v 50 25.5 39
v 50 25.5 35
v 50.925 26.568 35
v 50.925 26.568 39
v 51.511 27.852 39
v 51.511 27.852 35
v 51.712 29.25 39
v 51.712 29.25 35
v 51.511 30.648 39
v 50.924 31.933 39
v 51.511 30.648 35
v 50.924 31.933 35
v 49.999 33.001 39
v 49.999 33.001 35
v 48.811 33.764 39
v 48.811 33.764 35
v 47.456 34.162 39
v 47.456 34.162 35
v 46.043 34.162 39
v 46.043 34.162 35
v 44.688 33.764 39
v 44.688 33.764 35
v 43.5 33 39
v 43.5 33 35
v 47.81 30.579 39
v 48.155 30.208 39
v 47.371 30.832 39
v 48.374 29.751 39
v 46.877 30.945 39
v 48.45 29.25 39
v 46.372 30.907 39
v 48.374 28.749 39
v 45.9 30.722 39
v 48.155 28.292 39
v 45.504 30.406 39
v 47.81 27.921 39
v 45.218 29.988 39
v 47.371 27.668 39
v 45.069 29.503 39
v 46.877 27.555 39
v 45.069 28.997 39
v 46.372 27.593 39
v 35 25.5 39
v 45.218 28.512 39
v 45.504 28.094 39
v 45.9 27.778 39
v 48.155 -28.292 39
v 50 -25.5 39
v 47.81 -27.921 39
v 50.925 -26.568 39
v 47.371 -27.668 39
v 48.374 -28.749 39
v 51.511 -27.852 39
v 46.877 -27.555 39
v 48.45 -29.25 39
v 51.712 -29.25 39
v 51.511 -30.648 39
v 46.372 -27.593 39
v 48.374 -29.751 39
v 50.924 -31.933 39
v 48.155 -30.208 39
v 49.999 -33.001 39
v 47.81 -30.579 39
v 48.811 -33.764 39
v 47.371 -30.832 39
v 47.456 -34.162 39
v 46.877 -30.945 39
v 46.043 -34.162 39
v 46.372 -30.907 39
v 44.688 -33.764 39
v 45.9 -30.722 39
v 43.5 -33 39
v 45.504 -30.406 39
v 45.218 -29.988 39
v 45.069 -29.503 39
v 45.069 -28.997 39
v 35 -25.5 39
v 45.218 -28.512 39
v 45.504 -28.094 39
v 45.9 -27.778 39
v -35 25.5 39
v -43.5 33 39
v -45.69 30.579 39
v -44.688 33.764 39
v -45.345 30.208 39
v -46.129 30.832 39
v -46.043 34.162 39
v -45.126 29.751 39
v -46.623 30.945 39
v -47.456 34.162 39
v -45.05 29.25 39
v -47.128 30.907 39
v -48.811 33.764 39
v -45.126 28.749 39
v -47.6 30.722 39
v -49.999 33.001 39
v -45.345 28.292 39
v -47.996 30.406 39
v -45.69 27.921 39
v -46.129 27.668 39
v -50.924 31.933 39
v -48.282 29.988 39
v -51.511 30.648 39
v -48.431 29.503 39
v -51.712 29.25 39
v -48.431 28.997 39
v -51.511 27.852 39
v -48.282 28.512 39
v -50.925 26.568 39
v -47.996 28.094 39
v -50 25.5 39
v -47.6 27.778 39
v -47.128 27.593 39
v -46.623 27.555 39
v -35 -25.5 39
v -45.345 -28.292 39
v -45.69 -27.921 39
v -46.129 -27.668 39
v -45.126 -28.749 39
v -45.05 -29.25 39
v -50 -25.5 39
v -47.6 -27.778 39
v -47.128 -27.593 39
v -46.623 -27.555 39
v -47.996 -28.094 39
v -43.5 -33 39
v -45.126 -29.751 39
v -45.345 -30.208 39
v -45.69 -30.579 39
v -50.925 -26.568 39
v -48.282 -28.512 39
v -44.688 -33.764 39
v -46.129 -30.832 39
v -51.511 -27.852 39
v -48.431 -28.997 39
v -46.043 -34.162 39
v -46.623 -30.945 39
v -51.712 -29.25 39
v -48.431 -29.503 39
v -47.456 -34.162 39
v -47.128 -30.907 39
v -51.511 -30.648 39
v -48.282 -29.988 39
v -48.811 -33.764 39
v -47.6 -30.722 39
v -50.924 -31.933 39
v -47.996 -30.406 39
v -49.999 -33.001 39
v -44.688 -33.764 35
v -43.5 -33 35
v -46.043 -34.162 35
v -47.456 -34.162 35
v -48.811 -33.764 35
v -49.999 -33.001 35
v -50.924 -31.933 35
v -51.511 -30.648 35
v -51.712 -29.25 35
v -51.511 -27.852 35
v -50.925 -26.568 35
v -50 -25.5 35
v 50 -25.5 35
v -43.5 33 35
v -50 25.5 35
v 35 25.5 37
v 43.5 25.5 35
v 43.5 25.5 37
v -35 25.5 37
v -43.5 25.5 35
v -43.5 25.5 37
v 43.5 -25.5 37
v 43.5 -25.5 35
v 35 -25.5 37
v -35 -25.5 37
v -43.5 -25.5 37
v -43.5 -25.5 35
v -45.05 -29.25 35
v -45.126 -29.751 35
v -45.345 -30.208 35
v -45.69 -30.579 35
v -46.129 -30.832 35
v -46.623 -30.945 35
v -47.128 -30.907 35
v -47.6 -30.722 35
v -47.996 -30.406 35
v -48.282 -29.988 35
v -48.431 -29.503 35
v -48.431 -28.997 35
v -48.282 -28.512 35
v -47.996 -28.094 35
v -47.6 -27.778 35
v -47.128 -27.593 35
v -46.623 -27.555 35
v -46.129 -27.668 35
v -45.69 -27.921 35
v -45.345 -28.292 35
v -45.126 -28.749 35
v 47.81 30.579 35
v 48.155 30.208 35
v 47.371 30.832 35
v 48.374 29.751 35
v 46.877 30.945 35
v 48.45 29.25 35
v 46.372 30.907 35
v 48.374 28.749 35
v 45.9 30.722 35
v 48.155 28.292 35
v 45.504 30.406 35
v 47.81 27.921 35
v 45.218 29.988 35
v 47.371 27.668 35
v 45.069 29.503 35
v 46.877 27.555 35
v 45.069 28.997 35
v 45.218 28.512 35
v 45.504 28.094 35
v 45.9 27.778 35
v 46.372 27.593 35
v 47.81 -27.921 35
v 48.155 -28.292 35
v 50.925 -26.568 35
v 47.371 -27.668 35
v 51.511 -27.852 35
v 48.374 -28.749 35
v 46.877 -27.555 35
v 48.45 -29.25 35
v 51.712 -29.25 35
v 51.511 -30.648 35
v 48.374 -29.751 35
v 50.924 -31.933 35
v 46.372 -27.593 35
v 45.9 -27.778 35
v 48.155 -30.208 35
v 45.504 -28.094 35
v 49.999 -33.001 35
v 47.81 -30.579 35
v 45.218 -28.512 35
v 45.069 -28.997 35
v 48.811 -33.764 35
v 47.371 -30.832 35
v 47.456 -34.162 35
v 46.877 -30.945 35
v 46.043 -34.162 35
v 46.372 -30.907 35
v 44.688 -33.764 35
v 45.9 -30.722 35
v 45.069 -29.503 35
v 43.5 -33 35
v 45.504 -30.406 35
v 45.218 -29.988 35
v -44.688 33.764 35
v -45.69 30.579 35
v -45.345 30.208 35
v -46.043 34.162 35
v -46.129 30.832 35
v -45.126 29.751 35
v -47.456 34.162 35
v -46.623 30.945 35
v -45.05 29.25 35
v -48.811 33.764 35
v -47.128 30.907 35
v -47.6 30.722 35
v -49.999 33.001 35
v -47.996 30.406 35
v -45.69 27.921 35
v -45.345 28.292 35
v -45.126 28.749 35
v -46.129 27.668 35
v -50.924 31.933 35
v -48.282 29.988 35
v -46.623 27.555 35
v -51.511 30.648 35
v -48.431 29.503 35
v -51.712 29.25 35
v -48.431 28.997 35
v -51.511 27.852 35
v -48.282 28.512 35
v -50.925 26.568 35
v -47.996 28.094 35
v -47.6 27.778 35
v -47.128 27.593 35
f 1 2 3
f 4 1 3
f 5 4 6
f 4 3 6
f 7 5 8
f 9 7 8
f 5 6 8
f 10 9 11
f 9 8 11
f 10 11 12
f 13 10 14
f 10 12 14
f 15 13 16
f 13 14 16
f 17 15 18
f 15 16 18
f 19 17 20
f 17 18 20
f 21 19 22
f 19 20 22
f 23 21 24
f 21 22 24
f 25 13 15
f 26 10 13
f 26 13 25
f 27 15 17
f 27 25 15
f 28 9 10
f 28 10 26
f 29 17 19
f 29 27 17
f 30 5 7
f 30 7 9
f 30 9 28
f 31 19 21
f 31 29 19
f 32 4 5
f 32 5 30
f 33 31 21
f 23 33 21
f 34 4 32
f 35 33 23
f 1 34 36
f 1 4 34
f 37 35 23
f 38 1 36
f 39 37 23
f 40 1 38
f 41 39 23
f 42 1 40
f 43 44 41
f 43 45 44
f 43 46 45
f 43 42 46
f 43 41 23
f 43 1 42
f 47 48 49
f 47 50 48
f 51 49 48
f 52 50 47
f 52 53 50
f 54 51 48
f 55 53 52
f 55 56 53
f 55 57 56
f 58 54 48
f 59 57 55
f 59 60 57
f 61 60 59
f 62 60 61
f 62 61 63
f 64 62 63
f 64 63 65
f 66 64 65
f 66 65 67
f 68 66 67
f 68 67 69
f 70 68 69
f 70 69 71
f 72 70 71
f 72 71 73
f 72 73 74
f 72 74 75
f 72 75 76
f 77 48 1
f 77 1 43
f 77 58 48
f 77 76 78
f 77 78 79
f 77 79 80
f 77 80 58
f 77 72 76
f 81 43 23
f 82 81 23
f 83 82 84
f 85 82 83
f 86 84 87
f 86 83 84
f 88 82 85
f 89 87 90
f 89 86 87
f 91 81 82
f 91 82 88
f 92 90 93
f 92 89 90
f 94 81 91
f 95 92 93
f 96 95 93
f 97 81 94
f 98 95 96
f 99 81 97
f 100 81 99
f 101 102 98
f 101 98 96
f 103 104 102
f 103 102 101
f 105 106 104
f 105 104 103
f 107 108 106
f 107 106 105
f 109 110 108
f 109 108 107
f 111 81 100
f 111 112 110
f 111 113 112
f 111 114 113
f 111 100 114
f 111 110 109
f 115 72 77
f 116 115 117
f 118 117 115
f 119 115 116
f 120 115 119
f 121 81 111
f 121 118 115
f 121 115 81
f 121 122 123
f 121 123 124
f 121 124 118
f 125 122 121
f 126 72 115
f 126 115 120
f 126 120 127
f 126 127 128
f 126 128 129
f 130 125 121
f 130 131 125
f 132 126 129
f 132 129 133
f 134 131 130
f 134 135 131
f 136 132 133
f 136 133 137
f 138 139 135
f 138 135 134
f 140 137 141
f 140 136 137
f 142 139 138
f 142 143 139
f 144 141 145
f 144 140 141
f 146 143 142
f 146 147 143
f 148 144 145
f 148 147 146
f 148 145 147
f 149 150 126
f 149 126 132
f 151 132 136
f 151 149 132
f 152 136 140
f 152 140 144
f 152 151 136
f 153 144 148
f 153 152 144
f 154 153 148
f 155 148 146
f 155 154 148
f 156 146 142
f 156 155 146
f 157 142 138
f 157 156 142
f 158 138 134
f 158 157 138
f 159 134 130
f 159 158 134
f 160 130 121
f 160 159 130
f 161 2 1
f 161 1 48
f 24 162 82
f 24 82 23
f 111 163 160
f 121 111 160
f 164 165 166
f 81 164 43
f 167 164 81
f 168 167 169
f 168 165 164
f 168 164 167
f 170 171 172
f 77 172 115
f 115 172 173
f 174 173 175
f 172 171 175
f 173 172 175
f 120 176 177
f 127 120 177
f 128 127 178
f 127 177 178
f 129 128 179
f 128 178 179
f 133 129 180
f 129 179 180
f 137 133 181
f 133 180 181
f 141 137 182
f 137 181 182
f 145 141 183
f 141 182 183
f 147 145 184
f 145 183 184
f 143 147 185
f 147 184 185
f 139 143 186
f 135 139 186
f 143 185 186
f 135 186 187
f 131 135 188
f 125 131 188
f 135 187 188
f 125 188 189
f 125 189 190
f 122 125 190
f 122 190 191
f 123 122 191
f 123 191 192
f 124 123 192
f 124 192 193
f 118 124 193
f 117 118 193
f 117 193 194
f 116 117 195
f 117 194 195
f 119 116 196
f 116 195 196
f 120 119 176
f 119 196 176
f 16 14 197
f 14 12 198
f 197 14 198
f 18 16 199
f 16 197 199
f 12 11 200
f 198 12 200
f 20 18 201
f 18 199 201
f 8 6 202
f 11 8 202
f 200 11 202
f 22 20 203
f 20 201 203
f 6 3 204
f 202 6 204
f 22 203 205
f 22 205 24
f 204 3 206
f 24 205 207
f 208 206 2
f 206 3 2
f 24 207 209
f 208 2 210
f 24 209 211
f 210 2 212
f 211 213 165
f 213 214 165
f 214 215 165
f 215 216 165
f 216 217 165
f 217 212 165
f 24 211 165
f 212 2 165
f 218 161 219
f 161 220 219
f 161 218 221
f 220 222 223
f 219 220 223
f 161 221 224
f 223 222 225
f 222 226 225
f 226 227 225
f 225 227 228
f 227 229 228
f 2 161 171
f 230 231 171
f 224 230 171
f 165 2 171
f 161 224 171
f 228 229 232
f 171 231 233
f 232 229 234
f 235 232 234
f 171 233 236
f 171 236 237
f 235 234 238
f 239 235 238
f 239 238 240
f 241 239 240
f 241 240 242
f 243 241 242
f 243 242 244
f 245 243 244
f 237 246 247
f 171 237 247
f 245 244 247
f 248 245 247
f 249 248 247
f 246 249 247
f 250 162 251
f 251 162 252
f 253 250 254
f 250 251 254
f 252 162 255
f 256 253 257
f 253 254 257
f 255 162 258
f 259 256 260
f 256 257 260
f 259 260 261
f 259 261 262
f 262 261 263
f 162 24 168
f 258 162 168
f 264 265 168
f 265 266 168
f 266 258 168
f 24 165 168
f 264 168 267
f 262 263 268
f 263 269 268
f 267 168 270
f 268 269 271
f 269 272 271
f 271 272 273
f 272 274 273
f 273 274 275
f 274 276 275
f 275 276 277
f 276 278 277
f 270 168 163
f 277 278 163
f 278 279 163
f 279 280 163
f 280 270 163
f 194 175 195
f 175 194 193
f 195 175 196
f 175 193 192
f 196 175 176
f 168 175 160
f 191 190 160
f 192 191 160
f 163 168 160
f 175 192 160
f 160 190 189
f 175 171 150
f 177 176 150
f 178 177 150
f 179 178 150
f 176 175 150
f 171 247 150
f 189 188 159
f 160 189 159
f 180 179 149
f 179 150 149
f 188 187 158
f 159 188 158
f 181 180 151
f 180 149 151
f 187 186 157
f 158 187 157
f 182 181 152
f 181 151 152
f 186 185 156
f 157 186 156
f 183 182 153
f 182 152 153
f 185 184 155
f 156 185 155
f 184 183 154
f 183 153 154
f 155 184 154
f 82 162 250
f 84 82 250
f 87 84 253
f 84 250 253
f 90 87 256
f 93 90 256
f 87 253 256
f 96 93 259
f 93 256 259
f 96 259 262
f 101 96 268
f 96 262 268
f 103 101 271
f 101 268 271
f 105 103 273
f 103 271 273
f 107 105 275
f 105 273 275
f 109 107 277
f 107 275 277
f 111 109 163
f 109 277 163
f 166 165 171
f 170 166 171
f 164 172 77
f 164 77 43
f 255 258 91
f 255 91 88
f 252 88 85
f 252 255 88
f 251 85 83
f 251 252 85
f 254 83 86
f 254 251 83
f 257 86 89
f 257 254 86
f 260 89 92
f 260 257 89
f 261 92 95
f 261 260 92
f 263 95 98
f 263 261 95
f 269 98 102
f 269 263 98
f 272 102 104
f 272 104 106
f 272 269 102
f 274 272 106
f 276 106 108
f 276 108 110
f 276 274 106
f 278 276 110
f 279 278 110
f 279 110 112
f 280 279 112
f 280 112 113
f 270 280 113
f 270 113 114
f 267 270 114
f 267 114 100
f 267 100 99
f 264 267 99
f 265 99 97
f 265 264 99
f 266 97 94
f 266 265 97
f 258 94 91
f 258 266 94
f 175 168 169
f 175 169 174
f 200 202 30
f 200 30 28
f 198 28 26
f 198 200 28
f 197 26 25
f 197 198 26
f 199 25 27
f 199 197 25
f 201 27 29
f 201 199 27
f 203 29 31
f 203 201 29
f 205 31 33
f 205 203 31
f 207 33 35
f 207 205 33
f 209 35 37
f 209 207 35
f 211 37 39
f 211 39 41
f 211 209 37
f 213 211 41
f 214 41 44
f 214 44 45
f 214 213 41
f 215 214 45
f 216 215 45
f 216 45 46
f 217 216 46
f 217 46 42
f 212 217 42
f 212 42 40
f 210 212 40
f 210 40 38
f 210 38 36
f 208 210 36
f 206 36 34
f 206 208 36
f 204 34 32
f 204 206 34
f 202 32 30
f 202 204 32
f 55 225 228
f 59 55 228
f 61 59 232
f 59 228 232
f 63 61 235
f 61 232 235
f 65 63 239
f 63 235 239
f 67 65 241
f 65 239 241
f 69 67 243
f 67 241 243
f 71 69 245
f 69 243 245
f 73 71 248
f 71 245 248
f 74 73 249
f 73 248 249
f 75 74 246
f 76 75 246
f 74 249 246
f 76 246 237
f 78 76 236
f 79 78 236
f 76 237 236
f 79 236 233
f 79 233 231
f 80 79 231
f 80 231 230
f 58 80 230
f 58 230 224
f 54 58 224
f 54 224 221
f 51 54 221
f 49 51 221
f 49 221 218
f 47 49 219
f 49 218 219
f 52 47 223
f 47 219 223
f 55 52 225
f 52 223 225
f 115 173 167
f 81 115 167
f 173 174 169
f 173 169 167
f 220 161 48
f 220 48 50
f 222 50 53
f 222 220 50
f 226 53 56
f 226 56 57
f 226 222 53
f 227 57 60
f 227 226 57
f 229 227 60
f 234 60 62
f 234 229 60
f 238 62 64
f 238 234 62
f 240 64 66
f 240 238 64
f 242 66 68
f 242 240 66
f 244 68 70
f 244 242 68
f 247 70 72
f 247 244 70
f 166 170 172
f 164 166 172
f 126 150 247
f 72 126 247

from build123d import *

# Parameters (mm, degrees)
SKETCH005_R     = 1.7
PAD003_DEPTH    = 4
SKETCH006_W     = 8.5
SKETCH006_H     = 51
POCKET002_DEPTH = 2


with BuildPart() as part:
    # Sketch005 → Pad003 (new body)
    with BuildSketch(Plane.XY):
        with BuildLine():
            Line((35, 25.5), (-35, 25.5))
            Line((-35, 25.5), (-35, 0))
            Line((-35, 0), (-50, 0))
            Line((-50, 0), (-50, 25.5))
            ThreePointArc((-43.5, 33), (-50.5, 32.5), (-50, 25.5))
            Line((-43.5, 33), (43.5, 33))
            ThreePointArc((50, 25.5), (50.5, 32.5), (43.5, 33))
            Line((50, 0), (50, 25.5))
            Line((35, 0), (50, 0))
            Line((35, 25.5), (35, 0))
        make_face()
        with Locations((-46.75, 29.25)):
            Circle(SKETCH005_R, mode=Mode.SUBTRACT)
        with Locations((46.75, 29.25)):
            Circle(SKETCH005_R, mode=Mode.SUBTRACT)
    pad003 = extrude(amount=PAD003_DEPTH)

    # Mirrored003: Pad003 across XZ
    add(pad003.mirror(Plane.XZ))

    # Sketch006 (on Face4 of Mirrored003) → Pocket002 (cut)
    with BuildSketch(Plane(origin=(0, 0, 0), x_dir=(1, 0, 0), z_dir=(0, 0, -1))):
        with Locations((-39.25, 0)):
            Rectangle(SKETCH006_W, SKETCH006_H)
    pocket002 = extrude(amount=-POCKET002_DEPTH, mode=Mode.SUBTRACT)

    # Mirrored004: Pocket002 across Sketch006 V_Axis
    add(pocket002.mirror(Plane(origin=(0, 0, 0), x_dir=(0, 0, -1), z_dir=(1, 0, 0))), mode=Mode.SUBTRACT)


with BuildPart() as part_1:
    # Body001 placement: moved
    add(part.part.moved(Location((0, 0, 35))))


solid = part_1.part
